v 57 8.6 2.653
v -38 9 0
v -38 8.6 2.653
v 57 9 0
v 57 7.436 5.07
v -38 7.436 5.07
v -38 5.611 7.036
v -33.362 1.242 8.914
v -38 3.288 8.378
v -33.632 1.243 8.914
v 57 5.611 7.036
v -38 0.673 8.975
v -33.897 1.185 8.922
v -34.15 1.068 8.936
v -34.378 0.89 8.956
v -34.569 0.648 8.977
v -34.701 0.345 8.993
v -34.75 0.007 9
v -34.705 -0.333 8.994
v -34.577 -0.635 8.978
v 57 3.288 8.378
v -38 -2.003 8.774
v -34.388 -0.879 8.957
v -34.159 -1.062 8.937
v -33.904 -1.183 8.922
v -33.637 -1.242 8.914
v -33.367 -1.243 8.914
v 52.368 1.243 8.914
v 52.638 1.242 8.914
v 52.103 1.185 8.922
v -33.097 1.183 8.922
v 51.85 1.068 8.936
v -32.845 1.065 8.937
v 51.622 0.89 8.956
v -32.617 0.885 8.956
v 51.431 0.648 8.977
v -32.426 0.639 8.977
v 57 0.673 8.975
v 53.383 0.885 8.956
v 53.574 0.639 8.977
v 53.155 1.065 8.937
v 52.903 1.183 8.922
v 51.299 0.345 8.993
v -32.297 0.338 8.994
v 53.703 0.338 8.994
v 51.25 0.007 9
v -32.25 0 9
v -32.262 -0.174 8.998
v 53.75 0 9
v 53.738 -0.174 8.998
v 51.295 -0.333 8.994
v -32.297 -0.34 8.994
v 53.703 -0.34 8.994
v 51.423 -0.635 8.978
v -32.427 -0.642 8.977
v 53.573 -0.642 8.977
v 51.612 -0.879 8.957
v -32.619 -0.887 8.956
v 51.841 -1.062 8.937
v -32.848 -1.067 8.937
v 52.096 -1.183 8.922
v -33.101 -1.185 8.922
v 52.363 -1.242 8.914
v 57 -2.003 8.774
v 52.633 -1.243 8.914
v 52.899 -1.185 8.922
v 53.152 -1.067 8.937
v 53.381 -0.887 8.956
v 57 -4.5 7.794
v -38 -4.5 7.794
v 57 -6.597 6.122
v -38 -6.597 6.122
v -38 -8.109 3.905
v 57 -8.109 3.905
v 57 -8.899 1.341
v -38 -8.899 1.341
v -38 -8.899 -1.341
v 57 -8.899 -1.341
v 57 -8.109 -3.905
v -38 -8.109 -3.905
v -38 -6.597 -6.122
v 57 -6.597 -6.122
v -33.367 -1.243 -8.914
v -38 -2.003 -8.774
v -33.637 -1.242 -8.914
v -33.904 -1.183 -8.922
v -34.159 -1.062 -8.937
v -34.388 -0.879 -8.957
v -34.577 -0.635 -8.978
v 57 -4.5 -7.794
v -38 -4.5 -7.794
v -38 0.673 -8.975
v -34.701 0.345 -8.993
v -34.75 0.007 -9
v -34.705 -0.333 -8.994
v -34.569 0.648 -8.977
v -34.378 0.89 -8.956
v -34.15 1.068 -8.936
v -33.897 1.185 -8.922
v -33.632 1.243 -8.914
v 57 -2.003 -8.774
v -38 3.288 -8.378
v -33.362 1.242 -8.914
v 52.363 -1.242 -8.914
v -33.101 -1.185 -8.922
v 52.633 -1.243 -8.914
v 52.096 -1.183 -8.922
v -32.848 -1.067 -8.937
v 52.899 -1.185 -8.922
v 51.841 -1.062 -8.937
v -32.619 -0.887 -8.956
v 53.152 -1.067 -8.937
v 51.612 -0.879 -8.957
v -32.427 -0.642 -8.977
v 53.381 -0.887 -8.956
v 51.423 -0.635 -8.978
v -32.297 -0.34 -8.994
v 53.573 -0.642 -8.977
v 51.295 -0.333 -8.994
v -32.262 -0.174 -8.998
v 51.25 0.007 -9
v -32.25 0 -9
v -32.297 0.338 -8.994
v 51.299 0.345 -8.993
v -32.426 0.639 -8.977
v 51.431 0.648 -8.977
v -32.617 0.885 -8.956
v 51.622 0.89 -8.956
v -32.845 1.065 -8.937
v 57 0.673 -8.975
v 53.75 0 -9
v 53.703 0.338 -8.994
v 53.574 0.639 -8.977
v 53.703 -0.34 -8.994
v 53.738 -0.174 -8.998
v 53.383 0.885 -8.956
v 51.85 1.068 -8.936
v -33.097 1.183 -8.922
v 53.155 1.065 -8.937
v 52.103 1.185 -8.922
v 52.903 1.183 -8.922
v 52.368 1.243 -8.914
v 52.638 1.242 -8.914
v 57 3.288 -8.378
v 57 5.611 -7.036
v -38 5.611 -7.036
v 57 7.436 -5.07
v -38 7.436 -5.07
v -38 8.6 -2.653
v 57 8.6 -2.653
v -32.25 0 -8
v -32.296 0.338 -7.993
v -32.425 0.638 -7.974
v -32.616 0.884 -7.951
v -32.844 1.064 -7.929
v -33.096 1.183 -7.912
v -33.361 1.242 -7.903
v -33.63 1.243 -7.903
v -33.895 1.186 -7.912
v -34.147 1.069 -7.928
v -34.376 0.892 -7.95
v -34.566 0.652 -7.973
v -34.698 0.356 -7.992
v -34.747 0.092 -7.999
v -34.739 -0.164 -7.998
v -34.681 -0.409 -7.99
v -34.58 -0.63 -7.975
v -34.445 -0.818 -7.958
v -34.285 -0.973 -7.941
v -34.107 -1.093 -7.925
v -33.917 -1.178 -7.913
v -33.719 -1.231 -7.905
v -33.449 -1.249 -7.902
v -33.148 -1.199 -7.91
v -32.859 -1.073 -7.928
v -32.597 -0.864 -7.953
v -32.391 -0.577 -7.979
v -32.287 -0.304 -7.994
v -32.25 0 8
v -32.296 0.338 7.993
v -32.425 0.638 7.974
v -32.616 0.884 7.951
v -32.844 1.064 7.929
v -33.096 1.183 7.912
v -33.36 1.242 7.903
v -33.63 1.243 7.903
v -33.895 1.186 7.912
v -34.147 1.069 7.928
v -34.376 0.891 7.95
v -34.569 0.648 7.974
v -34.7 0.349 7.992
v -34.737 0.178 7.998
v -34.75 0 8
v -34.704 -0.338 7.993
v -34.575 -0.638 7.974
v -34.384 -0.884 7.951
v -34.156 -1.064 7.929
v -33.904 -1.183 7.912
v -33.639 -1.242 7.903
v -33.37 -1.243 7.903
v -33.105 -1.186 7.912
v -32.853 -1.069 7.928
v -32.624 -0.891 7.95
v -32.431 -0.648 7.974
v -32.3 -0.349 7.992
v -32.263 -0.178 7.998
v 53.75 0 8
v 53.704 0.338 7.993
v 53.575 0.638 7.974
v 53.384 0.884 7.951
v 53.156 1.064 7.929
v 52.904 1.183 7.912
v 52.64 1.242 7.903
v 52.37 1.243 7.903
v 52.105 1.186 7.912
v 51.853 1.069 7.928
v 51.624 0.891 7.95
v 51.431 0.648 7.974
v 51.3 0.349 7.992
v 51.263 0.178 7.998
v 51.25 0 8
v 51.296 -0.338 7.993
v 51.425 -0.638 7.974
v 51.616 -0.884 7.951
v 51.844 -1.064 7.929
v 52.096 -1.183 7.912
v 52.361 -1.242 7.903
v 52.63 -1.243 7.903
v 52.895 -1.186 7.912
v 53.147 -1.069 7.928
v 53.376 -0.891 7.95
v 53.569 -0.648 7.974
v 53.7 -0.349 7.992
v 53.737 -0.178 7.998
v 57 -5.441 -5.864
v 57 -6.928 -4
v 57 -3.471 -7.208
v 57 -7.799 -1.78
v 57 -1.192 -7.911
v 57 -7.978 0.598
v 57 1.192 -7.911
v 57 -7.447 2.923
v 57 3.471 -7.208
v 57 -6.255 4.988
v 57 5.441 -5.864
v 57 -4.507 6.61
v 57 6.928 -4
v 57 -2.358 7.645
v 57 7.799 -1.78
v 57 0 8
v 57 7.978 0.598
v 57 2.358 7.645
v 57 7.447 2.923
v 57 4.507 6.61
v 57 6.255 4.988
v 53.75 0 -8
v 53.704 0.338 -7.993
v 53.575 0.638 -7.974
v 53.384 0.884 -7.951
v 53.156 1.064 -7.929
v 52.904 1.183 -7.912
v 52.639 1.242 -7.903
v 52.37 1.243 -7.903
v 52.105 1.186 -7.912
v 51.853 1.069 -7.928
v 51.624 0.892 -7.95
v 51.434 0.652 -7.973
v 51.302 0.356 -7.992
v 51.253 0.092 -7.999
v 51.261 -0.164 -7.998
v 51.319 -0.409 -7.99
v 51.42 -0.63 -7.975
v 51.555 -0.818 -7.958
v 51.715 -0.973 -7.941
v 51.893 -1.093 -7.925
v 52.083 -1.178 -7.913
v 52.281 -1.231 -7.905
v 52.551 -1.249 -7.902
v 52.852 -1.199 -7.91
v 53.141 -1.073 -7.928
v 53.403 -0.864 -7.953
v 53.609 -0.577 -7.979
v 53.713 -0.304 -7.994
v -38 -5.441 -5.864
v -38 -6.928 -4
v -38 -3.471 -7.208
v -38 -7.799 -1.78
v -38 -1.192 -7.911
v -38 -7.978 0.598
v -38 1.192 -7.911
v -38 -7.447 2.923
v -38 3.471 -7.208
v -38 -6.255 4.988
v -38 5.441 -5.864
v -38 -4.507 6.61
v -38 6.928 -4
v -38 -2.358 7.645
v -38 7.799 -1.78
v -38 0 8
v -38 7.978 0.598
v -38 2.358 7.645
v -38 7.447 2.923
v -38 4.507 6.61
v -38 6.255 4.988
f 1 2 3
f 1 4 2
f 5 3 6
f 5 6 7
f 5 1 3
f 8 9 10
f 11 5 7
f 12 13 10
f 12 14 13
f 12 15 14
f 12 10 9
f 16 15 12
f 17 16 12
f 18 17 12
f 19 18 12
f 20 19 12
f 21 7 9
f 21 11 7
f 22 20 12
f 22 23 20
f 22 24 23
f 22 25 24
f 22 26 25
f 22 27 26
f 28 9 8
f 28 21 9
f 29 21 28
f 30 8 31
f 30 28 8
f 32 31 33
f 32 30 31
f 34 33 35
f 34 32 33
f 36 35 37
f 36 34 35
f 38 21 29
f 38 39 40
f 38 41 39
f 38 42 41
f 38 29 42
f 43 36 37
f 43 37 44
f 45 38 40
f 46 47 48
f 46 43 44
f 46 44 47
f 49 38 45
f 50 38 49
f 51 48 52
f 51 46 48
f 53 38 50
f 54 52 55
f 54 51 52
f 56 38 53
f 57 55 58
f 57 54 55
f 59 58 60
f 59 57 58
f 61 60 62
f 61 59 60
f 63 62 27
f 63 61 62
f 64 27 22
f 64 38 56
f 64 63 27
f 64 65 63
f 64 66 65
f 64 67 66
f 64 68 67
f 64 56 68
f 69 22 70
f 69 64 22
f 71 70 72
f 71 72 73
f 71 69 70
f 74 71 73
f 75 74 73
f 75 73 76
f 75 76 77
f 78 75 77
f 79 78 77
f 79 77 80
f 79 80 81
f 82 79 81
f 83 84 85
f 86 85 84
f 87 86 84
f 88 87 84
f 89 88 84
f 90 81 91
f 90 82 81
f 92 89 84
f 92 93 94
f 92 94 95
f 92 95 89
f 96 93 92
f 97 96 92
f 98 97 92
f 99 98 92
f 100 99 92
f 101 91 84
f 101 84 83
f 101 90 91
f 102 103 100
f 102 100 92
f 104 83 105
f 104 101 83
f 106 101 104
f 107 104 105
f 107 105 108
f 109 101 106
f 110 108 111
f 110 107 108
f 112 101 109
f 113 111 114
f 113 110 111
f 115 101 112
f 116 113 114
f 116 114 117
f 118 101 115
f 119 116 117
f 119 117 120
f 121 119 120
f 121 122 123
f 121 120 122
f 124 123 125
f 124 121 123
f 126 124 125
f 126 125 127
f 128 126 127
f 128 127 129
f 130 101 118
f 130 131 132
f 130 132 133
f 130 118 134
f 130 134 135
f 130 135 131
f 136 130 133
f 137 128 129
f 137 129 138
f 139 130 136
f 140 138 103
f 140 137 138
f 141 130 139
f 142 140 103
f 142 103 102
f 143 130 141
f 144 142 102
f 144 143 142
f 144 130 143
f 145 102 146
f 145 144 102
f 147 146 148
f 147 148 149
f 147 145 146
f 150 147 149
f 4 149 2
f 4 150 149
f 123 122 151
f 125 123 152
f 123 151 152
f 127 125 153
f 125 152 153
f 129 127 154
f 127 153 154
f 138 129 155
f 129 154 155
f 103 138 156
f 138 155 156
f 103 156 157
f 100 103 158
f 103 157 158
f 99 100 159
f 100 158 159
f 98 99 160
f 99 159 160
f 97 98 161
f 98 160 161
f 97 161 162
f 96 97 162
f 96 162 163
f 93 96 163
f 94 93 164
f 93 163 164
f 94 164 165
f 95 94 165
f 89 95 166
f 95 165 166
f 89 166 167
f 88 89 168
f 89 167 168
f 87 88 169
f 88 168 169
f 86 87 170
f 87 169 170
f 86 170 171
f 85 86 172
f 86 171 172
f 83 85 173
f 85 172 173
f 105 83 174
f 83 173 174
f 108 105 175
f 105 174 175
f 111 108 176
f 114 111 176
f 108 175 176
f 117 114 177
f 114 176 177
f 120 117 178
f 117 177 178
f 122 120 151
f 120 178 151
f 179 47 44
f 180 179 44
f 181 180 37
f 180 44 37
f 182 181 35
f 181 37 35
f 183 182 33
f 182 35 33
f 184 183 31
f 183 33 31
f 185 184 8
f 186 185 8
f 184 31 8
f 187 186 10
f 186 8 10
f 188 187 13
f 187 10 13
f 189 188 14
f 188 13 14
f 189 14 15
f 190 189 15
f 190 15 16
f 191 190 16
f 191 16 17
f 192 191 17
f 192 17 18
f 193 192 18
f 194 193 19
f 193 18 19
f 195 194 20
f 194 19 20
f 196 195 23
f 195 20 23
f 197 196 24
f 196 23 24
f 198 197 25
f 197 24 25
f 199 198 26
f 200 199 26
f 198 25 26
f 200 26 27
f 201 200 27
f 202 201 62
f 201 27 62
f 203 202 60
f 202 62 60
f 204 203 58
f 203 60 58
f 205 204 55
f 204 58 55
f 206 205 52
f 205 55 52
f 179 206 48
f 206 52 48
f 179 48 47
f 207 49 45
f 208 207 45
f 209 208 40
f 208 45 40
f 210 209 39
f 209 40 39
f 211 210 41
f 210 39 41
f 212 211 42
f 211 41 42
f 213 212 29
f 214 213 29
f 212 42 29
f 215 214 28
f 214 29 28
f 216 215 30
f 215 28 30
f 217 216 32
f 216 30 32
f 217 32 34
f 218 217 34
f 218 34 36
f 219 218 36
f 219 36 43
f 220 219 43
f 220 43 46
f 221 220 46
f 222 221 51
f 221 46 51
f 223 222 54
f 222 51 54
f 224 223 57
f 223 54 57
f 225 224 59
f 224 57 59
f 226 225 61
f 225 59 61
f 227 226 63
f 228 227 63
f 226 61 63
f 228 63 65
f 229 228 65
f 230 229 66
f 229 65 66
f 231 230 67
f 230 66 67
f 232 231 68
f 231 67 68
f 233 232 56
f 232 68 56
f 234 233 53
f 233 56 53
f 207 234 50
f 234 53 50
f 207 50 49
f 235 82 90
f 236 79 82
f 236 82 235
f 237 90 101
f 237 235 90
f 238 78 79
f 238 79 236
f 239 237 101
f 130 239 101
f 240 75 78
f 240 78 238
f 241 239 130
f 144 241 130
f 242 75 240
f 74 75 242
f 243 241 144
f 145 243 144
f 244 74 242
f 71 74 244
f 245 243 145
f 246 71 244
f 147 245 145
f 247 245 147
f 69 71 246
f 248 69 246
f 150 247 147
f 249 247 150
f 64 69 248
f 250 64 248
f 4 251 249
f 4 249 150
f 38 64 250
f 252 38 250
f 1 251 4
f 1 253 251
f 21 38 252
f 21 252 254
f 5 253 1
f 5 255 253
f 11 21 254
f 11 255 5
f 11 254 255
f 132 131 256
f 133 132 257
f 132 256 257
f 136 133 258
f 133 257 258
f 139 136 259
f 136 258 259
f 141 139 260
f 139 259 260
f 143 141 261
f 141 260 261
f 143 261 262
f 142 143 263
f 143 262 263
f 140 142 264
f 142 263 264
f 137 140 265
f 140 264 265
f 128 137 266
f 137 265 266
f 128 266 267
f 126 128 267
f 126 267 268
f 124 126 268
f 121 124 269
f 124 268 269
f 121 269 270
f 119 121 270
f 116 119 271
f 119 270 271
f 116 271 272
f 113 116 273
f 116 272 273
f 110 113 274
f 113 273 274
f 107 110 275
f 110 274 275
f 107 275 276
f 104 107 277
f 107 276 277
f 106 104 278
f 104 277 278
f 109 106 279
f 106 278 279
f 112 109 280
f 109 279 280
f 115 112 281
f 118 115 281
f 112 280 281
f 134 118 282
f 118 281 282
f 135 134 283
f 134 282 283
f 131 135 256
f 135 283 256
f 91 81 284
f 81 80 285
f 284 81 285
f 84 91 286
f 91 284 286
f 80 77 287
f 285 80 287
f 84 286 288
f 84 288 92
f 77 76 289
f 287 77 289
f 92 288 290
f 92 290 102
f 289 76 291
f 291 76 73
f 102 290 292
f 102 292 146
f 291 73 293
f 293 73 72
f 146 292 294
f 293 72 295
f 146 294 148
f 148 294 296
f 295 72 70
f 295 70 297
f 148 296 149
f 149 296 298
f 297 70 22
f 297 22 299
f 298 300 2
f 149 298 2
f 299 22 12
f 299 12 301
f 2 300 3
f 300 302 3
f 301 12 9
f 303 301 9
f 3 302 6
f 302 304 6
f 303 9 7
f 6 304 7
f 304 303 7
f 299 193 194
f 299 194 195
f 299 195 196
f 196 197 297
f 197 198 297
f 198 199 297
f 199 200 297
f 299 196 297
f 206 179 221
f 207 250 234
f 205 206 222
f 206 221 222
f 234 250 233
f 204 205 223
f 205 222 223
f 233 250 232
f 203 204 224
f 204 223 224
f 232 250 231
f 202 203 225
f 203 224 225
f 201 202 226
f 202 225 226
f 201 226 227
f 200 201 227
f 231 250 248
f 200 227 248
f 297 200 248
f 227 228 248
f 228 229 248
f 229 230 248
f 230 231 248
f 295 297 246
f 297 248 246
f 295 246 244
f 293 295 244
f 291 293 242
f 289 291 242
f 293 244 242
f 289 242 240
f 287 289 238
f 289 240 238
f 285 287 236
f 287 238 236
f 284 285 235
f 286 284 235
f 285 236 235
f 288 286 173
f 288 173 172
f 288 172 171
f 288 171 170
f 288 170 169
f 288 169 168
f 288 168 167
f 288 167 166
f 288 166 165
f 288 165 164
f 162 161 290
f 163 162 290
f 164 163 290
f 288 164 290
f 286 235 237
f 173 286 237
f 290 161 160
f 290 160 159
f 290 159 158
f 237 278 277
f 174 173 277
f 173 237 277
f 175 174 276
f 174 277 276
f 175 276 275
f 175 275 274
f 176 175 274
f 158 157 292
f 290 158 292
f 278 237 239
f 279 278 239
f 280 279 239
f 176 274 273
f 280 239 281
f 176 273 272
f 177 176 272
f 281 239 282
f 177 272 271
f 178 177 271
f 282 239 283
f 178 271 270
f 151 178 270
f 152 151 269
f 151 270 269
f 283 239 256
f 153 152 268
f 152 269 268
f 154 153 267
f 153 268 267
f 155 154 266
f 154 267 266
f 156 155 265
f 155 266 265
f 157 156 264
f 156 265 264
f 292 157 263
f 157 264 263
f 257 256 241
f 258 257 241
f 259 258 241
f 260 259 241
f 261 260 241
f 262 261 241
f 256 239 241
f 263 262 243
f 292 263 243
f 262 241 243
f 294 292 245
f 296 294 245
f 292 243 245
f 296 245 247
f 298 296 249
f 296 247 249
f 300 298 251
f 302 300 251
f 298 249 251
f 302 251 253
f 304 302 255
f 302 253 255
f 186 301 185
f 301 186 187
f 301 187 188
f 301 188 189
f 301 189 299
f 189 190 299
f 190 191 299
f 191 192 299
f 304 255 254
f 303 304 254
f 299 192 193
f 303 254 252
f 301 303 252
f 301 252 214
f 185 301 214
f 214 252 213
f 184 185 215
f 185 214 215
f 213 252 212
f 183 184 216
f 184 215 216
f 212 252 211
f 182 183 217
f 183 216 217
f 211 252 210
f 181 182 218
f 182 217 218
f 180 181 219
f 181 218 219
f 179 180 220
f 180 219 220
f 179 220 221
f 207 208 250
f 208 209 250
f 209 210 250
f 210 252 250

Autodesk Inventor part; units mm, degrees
ref_plane "YZ Plane" through (0, 0, 0) normal (1, 0, 0) x (0, 1, 0)
ref_plane "XZ Plane" through (0, 0, 0) normal (0, 1, 0) x (-1, 0, 0)
sketch "ShaftProfile" plane through (0, 0, 0) normal (0, 0, 1) x (1, 0, 0)
  line L0 (-57, 0) -> (76, 0) construction
  line L1 (-38, 9) -> (57, 9)
  line L2 (57, 9) -> (57, 0)
  line L3 (-38, 0) -> (-38, 9)
  line L4 (-38, 0) -> (57, 0)
  point P0 (0, 0)
  dimension "d1" = 95
  dimension "d2" = 9
  dimension "d4" = 38
revolve "ShaftFeature" add sketch "ShaftProfile" angle 360 about axis through (-38, 0, 0) along (1, 0, 0)
sketch "Sketch2" plane through (-38, 0, 0) normal (-1, 0, 0) x (0, 0, 1)
  circle A0 centre (0, 0) radius 9 projected
hole "ShaftHoleFeature" at (-38, 0, 0) direction (1, 0, 0) diameter 16 end through all
ref_plane "MidSidePlane" through (0, 0, 10) normal (0, 0, 1) x (1, 0, 0)
sketch "CapHoles" plane through (0, 0, 10) normal (0, 0, 1) x (1, 0, 0)
  line L0 (57, -9) -> (57, 9) construction
  line L1 (-38, -9) -> (-38, 9) construction
  line L2 (-58, 0) -> (82, 0) construction
  circle A0 centre (-33.5, 0) radius 1.25
  circle A1 centre (52.5, 0) radius 1.25
  dimension "d24" = 2.5
  dimension "d25" = 4.5
  dimension "d26" = 4.5
extrude "CapHolesFeature" cut sketch "CapHoles" against normal through all
equation "\"d26\" = d25"
properties part number "BackPair1PistonShaft"
